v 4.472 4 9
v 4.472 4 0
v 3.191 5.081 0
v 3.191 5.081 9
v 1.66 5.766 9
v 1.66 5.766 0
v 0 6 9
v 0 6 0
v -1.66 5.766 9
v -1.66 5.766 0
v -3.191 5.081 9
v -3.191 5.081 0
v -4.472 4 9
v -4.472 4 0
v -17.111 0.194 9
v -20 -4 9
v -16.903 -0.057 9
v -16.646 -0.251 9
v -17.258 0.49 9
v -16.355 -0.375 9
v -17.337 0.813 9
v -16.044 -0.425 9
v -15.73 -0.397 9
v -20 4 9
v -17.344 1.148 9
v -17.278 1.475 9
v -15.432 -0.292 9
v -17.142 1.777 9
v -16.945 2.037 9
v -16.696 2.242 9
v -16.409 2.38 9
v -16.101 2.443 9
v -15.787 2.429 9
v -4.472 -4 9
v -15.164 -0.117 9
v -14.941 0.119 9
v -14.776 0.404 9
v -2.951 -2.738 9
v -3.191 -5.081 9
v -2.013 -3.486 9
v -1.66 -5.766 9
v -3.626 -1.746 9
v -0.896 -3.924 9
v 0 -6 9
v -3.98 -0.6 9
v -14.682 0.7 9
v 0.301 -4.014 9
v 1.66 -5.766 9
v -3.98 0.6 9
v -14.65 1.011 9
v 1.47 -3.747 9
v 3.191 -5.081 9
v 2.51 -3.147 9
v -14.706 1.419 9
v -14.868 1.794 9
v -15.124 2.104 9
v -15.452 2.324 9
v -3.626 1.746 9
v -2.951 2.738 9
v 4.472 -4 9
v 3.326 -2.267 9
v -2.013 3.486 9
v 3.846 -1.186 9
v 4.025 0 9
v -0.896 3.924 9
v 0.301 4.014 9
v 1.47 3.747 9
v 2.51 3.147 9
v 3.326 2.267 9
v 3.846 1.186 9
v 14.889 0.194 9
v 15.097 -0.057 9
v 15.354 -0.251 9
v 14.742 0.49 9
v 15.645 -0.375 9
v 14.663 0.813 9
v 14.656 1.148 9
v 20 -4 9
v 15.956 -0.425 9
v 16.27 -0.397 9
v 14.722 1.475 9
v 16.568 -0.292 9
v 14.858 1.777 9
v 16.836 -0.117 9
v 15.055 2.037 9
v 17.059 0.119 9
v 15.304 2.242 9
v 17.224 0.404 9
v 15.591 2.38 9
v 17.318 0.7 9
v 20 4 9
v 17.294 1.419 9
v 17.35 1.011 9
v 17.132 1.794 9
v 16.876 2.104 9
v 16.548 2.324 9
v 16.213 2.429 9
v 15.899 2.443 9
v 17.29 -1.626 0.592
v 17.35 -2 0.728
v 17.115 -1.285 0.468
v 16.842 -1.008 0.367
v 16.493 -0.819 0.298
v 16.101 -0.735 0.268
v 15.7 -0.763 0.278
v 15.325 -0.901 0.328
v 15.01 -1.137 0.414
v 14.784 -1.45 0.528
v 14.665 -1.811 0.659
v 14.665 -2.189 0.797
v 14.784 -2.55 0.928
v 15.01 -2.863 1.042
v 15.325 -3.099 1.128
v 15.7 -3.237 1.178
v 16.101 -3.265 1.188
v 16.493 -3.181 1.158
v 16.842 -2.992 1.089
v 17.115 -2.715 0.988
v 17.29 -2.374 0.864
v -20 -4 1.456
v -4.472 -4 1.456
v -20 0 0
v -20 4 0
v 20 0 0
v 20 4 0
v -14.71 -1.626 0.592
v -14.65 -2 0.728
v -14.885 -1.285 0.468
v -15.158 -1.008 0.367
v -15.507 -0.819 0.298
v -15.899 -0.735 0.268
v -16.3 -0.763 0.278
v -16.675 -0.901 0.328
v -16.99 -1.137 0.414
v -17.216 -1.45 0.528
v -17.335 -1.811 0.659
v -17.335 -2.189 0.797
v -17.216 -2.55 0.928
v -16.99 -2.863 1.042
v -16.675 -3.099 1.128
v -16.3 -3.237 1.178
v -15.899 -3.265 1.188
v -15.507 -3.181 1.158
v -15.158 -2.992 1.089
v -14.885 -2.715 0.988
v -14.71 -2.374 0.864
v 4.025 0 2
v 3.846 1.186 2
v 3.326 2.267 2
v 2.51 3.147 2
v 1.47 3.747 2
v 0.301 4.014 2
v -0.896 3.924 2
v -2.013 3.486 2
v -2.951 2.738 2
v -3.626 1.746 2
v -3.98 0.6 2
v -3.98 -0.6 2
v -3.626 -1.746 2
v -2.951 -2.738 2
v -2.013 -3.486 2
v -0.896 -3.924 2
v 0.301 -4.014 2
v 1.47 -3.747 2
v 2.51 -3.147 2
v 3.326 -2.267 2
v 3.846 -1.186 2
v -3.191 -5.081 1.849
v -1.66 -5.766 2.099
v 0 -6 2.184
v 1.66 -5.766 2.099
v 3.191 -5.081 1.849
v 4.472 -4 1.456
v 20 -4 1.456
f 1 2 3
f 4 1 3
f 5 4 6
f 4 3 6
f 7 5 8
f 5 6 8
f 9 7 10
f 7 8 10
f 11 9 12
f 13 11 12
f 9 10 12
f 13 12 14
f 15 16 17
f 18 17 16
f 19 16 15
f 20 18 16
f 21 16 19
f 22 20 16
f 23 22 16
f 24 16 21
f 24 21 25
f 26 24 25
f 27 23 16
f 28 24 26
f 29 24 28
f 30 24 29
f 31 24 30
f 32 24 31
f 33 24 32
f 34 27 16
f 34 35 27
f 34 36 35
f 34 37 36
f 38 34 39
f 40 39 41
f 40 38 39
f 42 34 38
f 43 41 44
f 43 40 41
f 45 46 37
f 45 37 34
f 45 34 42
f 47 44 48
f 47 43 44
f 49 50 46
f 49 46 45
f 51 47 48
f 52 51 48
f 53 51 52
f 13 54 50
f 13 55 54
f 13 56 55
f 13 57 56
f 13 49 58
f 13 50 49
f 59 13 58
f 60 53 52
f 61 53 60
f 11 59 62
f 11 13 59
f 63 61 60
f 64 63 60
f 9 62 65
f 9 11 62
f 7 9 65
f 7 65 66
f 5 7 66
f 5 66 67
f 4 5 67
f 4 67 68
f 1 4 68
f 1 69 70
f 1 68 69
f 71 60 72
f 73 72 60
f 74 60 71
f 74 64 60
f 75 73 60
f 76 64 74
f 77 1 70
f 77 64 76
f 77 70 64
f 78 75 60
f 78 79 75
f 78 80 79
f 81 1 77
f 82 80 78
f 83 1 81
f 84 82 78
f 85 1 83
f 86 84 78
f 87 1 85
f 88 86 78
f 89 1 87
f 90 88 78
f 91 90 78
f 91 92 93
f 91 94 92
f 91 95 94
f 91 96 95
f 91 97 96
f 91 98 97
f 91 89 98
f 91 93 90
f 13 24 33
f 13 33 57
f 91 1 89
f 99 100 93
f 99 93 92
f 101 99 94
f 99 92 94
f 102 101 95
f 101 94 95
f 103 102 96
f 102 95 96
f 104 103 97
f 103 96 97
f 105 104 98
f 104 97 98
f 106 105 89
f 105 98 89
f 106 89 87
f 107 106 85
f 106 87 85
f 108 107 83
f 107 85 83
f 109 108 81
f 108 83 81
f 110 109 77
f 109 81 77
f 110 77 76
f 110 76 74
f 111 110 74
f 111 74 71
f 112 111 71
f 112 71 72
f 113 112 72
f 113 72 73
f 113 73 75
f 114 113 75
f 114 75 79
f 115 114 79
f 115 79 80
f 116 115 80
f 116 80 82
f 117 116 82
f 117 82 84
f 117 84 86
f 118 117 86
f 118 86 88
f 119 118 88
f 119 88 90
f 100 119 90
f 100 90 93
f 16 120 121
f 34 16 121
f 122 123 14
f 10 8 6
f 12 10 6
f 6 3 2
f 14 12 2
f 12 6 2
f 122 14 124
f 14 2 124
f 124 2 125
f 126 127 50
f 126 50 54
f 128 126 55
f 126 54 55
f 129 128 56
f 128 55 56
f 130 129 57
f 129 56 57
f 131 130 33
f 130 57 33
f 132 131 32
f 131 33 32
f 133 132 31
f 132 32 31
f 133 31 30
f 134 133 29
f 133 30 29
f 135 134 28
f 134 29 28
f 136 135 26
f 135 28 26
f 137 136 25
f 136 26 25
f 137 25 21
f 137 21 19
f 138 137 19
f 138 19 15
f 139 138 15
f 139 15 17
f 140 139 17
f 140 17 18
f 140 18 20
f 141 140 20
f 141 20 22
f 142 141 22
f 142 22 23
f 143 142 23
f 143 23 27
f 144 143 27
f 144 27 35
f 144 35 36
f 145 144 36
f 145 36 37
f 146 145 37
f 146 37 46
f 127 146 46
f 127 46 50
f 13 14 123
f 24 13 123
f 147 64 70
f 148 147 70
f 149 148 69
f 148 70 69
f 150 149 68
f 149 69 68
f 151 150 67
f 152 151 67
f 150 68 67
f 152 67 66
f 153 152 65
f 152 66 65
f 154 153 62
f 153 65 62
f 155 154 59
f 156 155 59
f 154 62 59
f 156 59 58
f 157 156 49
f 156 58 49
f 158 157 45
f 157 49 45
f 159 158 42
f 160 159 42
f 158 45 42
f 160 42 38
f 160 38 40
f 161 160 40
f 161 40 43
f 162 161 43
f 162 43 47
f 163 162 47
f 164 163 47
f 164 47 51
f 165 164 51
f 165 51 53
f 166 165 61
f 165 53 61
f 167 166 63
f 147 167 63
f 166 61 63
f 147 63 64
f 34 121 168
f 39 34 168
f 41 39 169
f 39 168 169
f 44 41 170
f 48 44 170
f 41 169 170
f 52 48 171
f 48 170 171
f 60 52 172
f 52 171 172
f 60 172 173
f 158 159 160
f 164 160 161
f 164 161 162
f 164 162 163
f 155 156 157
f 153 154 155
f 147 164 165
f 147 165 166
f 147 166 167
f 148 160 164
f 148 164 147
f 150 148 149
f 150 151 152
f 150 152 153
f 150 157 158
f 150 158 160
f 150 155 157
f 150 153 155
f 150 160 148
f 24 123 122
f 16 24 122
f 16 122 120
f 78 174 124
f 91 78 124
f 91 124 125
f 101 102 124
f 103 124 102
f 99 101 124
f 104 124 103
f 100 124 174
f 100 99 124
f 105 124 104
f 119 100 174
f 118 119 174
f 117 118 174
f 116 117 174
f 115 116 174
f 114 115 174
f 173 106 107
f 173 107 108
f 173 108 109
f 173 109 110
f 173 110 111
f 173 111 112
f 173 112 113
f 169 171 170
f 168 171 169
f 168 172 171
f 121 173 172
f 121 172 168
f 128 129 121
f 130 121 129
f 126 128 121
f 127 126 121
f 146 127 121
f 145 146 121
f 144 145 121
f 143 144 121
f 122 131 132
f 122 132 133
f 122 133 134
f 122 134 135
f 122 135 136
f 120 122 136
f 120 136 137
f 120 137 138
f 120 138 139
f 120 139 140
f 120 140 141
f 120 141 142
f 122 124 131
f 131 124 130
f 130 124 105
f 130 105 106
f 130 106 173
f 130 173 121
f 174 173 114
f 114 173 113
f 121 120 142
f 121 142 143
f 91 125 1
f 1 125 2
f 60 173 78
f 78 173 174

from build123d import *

# Parameters (mm, degrees)
BOSS_EXTRUDE1_DEPTH        = 9
SKETCH11_R                 = 4.025
CUT_EXTRUDE4_DEPTH         = 7
CUT_EXTRUDE2_DEPTH         = 42.43669871
F_2_7_2_7_DIAMETER_HOLE1_D = 2.7


with BuildPart() as part:
    # Sketch1 → Boss-Extrude1 (new body)
    with BuildSketch(Plane.XY):
        with BuildLine():
            Line((-4.472135955, 4), (-20, 4))
            Line((-20, 4), (-20, -4))
            Line((-20, -4), (-4.472135955, -4))
            ThreePointArc((-4.472135955, -4), (0, -6), (4.472135955, -4))
            Line((4.472135955, -4), (20, -4))
            Line((20, -4), (20, 4))
            Line((20, 4), (4.472135955, 4))
            ThreePointArc((4.472135955, 4), (0, 6), (-4.472135955, 4))
        make_face()
    extrude(amount=BOSS_EXTRUDE1_DEPTH)

    # Sketch11 → Cut-Extrude4 (cut)
    with BuildSketch(Plane.XY.offset(9)):
        Circle(SKETCH11_R)
    extrude(amount=-CUT_EXTRUDE4_DEPTH, mode=Mode.SUBTRACT)

    # Sketch5 → Cut-Extrude2 (cut, through all)
    with BuildSketch(Plane.ZY.offset(20)):
        Polygon((0, 0), (2.183821406, -6), (0, -6), align=None)
    extrude(amount=-CUT_EXTRUDE2_DEPTH, mode=Mode.SUBTRACT)

    # Ø2.7 (2.7) Diameter Hole1 (through all)
    with Locations(Plane(origin=(0, 0, 0), x_dir=(-1, 0, 0), z_dir=(0, -0.34202014332566316, -0.9396926207859104))):
        with Locations((-16, -2.128355545), (16, -2.128355545)):
            Hole(F_2_7_2_7_DIAMETER_HOLE1_D / 2)


solid = part.part
